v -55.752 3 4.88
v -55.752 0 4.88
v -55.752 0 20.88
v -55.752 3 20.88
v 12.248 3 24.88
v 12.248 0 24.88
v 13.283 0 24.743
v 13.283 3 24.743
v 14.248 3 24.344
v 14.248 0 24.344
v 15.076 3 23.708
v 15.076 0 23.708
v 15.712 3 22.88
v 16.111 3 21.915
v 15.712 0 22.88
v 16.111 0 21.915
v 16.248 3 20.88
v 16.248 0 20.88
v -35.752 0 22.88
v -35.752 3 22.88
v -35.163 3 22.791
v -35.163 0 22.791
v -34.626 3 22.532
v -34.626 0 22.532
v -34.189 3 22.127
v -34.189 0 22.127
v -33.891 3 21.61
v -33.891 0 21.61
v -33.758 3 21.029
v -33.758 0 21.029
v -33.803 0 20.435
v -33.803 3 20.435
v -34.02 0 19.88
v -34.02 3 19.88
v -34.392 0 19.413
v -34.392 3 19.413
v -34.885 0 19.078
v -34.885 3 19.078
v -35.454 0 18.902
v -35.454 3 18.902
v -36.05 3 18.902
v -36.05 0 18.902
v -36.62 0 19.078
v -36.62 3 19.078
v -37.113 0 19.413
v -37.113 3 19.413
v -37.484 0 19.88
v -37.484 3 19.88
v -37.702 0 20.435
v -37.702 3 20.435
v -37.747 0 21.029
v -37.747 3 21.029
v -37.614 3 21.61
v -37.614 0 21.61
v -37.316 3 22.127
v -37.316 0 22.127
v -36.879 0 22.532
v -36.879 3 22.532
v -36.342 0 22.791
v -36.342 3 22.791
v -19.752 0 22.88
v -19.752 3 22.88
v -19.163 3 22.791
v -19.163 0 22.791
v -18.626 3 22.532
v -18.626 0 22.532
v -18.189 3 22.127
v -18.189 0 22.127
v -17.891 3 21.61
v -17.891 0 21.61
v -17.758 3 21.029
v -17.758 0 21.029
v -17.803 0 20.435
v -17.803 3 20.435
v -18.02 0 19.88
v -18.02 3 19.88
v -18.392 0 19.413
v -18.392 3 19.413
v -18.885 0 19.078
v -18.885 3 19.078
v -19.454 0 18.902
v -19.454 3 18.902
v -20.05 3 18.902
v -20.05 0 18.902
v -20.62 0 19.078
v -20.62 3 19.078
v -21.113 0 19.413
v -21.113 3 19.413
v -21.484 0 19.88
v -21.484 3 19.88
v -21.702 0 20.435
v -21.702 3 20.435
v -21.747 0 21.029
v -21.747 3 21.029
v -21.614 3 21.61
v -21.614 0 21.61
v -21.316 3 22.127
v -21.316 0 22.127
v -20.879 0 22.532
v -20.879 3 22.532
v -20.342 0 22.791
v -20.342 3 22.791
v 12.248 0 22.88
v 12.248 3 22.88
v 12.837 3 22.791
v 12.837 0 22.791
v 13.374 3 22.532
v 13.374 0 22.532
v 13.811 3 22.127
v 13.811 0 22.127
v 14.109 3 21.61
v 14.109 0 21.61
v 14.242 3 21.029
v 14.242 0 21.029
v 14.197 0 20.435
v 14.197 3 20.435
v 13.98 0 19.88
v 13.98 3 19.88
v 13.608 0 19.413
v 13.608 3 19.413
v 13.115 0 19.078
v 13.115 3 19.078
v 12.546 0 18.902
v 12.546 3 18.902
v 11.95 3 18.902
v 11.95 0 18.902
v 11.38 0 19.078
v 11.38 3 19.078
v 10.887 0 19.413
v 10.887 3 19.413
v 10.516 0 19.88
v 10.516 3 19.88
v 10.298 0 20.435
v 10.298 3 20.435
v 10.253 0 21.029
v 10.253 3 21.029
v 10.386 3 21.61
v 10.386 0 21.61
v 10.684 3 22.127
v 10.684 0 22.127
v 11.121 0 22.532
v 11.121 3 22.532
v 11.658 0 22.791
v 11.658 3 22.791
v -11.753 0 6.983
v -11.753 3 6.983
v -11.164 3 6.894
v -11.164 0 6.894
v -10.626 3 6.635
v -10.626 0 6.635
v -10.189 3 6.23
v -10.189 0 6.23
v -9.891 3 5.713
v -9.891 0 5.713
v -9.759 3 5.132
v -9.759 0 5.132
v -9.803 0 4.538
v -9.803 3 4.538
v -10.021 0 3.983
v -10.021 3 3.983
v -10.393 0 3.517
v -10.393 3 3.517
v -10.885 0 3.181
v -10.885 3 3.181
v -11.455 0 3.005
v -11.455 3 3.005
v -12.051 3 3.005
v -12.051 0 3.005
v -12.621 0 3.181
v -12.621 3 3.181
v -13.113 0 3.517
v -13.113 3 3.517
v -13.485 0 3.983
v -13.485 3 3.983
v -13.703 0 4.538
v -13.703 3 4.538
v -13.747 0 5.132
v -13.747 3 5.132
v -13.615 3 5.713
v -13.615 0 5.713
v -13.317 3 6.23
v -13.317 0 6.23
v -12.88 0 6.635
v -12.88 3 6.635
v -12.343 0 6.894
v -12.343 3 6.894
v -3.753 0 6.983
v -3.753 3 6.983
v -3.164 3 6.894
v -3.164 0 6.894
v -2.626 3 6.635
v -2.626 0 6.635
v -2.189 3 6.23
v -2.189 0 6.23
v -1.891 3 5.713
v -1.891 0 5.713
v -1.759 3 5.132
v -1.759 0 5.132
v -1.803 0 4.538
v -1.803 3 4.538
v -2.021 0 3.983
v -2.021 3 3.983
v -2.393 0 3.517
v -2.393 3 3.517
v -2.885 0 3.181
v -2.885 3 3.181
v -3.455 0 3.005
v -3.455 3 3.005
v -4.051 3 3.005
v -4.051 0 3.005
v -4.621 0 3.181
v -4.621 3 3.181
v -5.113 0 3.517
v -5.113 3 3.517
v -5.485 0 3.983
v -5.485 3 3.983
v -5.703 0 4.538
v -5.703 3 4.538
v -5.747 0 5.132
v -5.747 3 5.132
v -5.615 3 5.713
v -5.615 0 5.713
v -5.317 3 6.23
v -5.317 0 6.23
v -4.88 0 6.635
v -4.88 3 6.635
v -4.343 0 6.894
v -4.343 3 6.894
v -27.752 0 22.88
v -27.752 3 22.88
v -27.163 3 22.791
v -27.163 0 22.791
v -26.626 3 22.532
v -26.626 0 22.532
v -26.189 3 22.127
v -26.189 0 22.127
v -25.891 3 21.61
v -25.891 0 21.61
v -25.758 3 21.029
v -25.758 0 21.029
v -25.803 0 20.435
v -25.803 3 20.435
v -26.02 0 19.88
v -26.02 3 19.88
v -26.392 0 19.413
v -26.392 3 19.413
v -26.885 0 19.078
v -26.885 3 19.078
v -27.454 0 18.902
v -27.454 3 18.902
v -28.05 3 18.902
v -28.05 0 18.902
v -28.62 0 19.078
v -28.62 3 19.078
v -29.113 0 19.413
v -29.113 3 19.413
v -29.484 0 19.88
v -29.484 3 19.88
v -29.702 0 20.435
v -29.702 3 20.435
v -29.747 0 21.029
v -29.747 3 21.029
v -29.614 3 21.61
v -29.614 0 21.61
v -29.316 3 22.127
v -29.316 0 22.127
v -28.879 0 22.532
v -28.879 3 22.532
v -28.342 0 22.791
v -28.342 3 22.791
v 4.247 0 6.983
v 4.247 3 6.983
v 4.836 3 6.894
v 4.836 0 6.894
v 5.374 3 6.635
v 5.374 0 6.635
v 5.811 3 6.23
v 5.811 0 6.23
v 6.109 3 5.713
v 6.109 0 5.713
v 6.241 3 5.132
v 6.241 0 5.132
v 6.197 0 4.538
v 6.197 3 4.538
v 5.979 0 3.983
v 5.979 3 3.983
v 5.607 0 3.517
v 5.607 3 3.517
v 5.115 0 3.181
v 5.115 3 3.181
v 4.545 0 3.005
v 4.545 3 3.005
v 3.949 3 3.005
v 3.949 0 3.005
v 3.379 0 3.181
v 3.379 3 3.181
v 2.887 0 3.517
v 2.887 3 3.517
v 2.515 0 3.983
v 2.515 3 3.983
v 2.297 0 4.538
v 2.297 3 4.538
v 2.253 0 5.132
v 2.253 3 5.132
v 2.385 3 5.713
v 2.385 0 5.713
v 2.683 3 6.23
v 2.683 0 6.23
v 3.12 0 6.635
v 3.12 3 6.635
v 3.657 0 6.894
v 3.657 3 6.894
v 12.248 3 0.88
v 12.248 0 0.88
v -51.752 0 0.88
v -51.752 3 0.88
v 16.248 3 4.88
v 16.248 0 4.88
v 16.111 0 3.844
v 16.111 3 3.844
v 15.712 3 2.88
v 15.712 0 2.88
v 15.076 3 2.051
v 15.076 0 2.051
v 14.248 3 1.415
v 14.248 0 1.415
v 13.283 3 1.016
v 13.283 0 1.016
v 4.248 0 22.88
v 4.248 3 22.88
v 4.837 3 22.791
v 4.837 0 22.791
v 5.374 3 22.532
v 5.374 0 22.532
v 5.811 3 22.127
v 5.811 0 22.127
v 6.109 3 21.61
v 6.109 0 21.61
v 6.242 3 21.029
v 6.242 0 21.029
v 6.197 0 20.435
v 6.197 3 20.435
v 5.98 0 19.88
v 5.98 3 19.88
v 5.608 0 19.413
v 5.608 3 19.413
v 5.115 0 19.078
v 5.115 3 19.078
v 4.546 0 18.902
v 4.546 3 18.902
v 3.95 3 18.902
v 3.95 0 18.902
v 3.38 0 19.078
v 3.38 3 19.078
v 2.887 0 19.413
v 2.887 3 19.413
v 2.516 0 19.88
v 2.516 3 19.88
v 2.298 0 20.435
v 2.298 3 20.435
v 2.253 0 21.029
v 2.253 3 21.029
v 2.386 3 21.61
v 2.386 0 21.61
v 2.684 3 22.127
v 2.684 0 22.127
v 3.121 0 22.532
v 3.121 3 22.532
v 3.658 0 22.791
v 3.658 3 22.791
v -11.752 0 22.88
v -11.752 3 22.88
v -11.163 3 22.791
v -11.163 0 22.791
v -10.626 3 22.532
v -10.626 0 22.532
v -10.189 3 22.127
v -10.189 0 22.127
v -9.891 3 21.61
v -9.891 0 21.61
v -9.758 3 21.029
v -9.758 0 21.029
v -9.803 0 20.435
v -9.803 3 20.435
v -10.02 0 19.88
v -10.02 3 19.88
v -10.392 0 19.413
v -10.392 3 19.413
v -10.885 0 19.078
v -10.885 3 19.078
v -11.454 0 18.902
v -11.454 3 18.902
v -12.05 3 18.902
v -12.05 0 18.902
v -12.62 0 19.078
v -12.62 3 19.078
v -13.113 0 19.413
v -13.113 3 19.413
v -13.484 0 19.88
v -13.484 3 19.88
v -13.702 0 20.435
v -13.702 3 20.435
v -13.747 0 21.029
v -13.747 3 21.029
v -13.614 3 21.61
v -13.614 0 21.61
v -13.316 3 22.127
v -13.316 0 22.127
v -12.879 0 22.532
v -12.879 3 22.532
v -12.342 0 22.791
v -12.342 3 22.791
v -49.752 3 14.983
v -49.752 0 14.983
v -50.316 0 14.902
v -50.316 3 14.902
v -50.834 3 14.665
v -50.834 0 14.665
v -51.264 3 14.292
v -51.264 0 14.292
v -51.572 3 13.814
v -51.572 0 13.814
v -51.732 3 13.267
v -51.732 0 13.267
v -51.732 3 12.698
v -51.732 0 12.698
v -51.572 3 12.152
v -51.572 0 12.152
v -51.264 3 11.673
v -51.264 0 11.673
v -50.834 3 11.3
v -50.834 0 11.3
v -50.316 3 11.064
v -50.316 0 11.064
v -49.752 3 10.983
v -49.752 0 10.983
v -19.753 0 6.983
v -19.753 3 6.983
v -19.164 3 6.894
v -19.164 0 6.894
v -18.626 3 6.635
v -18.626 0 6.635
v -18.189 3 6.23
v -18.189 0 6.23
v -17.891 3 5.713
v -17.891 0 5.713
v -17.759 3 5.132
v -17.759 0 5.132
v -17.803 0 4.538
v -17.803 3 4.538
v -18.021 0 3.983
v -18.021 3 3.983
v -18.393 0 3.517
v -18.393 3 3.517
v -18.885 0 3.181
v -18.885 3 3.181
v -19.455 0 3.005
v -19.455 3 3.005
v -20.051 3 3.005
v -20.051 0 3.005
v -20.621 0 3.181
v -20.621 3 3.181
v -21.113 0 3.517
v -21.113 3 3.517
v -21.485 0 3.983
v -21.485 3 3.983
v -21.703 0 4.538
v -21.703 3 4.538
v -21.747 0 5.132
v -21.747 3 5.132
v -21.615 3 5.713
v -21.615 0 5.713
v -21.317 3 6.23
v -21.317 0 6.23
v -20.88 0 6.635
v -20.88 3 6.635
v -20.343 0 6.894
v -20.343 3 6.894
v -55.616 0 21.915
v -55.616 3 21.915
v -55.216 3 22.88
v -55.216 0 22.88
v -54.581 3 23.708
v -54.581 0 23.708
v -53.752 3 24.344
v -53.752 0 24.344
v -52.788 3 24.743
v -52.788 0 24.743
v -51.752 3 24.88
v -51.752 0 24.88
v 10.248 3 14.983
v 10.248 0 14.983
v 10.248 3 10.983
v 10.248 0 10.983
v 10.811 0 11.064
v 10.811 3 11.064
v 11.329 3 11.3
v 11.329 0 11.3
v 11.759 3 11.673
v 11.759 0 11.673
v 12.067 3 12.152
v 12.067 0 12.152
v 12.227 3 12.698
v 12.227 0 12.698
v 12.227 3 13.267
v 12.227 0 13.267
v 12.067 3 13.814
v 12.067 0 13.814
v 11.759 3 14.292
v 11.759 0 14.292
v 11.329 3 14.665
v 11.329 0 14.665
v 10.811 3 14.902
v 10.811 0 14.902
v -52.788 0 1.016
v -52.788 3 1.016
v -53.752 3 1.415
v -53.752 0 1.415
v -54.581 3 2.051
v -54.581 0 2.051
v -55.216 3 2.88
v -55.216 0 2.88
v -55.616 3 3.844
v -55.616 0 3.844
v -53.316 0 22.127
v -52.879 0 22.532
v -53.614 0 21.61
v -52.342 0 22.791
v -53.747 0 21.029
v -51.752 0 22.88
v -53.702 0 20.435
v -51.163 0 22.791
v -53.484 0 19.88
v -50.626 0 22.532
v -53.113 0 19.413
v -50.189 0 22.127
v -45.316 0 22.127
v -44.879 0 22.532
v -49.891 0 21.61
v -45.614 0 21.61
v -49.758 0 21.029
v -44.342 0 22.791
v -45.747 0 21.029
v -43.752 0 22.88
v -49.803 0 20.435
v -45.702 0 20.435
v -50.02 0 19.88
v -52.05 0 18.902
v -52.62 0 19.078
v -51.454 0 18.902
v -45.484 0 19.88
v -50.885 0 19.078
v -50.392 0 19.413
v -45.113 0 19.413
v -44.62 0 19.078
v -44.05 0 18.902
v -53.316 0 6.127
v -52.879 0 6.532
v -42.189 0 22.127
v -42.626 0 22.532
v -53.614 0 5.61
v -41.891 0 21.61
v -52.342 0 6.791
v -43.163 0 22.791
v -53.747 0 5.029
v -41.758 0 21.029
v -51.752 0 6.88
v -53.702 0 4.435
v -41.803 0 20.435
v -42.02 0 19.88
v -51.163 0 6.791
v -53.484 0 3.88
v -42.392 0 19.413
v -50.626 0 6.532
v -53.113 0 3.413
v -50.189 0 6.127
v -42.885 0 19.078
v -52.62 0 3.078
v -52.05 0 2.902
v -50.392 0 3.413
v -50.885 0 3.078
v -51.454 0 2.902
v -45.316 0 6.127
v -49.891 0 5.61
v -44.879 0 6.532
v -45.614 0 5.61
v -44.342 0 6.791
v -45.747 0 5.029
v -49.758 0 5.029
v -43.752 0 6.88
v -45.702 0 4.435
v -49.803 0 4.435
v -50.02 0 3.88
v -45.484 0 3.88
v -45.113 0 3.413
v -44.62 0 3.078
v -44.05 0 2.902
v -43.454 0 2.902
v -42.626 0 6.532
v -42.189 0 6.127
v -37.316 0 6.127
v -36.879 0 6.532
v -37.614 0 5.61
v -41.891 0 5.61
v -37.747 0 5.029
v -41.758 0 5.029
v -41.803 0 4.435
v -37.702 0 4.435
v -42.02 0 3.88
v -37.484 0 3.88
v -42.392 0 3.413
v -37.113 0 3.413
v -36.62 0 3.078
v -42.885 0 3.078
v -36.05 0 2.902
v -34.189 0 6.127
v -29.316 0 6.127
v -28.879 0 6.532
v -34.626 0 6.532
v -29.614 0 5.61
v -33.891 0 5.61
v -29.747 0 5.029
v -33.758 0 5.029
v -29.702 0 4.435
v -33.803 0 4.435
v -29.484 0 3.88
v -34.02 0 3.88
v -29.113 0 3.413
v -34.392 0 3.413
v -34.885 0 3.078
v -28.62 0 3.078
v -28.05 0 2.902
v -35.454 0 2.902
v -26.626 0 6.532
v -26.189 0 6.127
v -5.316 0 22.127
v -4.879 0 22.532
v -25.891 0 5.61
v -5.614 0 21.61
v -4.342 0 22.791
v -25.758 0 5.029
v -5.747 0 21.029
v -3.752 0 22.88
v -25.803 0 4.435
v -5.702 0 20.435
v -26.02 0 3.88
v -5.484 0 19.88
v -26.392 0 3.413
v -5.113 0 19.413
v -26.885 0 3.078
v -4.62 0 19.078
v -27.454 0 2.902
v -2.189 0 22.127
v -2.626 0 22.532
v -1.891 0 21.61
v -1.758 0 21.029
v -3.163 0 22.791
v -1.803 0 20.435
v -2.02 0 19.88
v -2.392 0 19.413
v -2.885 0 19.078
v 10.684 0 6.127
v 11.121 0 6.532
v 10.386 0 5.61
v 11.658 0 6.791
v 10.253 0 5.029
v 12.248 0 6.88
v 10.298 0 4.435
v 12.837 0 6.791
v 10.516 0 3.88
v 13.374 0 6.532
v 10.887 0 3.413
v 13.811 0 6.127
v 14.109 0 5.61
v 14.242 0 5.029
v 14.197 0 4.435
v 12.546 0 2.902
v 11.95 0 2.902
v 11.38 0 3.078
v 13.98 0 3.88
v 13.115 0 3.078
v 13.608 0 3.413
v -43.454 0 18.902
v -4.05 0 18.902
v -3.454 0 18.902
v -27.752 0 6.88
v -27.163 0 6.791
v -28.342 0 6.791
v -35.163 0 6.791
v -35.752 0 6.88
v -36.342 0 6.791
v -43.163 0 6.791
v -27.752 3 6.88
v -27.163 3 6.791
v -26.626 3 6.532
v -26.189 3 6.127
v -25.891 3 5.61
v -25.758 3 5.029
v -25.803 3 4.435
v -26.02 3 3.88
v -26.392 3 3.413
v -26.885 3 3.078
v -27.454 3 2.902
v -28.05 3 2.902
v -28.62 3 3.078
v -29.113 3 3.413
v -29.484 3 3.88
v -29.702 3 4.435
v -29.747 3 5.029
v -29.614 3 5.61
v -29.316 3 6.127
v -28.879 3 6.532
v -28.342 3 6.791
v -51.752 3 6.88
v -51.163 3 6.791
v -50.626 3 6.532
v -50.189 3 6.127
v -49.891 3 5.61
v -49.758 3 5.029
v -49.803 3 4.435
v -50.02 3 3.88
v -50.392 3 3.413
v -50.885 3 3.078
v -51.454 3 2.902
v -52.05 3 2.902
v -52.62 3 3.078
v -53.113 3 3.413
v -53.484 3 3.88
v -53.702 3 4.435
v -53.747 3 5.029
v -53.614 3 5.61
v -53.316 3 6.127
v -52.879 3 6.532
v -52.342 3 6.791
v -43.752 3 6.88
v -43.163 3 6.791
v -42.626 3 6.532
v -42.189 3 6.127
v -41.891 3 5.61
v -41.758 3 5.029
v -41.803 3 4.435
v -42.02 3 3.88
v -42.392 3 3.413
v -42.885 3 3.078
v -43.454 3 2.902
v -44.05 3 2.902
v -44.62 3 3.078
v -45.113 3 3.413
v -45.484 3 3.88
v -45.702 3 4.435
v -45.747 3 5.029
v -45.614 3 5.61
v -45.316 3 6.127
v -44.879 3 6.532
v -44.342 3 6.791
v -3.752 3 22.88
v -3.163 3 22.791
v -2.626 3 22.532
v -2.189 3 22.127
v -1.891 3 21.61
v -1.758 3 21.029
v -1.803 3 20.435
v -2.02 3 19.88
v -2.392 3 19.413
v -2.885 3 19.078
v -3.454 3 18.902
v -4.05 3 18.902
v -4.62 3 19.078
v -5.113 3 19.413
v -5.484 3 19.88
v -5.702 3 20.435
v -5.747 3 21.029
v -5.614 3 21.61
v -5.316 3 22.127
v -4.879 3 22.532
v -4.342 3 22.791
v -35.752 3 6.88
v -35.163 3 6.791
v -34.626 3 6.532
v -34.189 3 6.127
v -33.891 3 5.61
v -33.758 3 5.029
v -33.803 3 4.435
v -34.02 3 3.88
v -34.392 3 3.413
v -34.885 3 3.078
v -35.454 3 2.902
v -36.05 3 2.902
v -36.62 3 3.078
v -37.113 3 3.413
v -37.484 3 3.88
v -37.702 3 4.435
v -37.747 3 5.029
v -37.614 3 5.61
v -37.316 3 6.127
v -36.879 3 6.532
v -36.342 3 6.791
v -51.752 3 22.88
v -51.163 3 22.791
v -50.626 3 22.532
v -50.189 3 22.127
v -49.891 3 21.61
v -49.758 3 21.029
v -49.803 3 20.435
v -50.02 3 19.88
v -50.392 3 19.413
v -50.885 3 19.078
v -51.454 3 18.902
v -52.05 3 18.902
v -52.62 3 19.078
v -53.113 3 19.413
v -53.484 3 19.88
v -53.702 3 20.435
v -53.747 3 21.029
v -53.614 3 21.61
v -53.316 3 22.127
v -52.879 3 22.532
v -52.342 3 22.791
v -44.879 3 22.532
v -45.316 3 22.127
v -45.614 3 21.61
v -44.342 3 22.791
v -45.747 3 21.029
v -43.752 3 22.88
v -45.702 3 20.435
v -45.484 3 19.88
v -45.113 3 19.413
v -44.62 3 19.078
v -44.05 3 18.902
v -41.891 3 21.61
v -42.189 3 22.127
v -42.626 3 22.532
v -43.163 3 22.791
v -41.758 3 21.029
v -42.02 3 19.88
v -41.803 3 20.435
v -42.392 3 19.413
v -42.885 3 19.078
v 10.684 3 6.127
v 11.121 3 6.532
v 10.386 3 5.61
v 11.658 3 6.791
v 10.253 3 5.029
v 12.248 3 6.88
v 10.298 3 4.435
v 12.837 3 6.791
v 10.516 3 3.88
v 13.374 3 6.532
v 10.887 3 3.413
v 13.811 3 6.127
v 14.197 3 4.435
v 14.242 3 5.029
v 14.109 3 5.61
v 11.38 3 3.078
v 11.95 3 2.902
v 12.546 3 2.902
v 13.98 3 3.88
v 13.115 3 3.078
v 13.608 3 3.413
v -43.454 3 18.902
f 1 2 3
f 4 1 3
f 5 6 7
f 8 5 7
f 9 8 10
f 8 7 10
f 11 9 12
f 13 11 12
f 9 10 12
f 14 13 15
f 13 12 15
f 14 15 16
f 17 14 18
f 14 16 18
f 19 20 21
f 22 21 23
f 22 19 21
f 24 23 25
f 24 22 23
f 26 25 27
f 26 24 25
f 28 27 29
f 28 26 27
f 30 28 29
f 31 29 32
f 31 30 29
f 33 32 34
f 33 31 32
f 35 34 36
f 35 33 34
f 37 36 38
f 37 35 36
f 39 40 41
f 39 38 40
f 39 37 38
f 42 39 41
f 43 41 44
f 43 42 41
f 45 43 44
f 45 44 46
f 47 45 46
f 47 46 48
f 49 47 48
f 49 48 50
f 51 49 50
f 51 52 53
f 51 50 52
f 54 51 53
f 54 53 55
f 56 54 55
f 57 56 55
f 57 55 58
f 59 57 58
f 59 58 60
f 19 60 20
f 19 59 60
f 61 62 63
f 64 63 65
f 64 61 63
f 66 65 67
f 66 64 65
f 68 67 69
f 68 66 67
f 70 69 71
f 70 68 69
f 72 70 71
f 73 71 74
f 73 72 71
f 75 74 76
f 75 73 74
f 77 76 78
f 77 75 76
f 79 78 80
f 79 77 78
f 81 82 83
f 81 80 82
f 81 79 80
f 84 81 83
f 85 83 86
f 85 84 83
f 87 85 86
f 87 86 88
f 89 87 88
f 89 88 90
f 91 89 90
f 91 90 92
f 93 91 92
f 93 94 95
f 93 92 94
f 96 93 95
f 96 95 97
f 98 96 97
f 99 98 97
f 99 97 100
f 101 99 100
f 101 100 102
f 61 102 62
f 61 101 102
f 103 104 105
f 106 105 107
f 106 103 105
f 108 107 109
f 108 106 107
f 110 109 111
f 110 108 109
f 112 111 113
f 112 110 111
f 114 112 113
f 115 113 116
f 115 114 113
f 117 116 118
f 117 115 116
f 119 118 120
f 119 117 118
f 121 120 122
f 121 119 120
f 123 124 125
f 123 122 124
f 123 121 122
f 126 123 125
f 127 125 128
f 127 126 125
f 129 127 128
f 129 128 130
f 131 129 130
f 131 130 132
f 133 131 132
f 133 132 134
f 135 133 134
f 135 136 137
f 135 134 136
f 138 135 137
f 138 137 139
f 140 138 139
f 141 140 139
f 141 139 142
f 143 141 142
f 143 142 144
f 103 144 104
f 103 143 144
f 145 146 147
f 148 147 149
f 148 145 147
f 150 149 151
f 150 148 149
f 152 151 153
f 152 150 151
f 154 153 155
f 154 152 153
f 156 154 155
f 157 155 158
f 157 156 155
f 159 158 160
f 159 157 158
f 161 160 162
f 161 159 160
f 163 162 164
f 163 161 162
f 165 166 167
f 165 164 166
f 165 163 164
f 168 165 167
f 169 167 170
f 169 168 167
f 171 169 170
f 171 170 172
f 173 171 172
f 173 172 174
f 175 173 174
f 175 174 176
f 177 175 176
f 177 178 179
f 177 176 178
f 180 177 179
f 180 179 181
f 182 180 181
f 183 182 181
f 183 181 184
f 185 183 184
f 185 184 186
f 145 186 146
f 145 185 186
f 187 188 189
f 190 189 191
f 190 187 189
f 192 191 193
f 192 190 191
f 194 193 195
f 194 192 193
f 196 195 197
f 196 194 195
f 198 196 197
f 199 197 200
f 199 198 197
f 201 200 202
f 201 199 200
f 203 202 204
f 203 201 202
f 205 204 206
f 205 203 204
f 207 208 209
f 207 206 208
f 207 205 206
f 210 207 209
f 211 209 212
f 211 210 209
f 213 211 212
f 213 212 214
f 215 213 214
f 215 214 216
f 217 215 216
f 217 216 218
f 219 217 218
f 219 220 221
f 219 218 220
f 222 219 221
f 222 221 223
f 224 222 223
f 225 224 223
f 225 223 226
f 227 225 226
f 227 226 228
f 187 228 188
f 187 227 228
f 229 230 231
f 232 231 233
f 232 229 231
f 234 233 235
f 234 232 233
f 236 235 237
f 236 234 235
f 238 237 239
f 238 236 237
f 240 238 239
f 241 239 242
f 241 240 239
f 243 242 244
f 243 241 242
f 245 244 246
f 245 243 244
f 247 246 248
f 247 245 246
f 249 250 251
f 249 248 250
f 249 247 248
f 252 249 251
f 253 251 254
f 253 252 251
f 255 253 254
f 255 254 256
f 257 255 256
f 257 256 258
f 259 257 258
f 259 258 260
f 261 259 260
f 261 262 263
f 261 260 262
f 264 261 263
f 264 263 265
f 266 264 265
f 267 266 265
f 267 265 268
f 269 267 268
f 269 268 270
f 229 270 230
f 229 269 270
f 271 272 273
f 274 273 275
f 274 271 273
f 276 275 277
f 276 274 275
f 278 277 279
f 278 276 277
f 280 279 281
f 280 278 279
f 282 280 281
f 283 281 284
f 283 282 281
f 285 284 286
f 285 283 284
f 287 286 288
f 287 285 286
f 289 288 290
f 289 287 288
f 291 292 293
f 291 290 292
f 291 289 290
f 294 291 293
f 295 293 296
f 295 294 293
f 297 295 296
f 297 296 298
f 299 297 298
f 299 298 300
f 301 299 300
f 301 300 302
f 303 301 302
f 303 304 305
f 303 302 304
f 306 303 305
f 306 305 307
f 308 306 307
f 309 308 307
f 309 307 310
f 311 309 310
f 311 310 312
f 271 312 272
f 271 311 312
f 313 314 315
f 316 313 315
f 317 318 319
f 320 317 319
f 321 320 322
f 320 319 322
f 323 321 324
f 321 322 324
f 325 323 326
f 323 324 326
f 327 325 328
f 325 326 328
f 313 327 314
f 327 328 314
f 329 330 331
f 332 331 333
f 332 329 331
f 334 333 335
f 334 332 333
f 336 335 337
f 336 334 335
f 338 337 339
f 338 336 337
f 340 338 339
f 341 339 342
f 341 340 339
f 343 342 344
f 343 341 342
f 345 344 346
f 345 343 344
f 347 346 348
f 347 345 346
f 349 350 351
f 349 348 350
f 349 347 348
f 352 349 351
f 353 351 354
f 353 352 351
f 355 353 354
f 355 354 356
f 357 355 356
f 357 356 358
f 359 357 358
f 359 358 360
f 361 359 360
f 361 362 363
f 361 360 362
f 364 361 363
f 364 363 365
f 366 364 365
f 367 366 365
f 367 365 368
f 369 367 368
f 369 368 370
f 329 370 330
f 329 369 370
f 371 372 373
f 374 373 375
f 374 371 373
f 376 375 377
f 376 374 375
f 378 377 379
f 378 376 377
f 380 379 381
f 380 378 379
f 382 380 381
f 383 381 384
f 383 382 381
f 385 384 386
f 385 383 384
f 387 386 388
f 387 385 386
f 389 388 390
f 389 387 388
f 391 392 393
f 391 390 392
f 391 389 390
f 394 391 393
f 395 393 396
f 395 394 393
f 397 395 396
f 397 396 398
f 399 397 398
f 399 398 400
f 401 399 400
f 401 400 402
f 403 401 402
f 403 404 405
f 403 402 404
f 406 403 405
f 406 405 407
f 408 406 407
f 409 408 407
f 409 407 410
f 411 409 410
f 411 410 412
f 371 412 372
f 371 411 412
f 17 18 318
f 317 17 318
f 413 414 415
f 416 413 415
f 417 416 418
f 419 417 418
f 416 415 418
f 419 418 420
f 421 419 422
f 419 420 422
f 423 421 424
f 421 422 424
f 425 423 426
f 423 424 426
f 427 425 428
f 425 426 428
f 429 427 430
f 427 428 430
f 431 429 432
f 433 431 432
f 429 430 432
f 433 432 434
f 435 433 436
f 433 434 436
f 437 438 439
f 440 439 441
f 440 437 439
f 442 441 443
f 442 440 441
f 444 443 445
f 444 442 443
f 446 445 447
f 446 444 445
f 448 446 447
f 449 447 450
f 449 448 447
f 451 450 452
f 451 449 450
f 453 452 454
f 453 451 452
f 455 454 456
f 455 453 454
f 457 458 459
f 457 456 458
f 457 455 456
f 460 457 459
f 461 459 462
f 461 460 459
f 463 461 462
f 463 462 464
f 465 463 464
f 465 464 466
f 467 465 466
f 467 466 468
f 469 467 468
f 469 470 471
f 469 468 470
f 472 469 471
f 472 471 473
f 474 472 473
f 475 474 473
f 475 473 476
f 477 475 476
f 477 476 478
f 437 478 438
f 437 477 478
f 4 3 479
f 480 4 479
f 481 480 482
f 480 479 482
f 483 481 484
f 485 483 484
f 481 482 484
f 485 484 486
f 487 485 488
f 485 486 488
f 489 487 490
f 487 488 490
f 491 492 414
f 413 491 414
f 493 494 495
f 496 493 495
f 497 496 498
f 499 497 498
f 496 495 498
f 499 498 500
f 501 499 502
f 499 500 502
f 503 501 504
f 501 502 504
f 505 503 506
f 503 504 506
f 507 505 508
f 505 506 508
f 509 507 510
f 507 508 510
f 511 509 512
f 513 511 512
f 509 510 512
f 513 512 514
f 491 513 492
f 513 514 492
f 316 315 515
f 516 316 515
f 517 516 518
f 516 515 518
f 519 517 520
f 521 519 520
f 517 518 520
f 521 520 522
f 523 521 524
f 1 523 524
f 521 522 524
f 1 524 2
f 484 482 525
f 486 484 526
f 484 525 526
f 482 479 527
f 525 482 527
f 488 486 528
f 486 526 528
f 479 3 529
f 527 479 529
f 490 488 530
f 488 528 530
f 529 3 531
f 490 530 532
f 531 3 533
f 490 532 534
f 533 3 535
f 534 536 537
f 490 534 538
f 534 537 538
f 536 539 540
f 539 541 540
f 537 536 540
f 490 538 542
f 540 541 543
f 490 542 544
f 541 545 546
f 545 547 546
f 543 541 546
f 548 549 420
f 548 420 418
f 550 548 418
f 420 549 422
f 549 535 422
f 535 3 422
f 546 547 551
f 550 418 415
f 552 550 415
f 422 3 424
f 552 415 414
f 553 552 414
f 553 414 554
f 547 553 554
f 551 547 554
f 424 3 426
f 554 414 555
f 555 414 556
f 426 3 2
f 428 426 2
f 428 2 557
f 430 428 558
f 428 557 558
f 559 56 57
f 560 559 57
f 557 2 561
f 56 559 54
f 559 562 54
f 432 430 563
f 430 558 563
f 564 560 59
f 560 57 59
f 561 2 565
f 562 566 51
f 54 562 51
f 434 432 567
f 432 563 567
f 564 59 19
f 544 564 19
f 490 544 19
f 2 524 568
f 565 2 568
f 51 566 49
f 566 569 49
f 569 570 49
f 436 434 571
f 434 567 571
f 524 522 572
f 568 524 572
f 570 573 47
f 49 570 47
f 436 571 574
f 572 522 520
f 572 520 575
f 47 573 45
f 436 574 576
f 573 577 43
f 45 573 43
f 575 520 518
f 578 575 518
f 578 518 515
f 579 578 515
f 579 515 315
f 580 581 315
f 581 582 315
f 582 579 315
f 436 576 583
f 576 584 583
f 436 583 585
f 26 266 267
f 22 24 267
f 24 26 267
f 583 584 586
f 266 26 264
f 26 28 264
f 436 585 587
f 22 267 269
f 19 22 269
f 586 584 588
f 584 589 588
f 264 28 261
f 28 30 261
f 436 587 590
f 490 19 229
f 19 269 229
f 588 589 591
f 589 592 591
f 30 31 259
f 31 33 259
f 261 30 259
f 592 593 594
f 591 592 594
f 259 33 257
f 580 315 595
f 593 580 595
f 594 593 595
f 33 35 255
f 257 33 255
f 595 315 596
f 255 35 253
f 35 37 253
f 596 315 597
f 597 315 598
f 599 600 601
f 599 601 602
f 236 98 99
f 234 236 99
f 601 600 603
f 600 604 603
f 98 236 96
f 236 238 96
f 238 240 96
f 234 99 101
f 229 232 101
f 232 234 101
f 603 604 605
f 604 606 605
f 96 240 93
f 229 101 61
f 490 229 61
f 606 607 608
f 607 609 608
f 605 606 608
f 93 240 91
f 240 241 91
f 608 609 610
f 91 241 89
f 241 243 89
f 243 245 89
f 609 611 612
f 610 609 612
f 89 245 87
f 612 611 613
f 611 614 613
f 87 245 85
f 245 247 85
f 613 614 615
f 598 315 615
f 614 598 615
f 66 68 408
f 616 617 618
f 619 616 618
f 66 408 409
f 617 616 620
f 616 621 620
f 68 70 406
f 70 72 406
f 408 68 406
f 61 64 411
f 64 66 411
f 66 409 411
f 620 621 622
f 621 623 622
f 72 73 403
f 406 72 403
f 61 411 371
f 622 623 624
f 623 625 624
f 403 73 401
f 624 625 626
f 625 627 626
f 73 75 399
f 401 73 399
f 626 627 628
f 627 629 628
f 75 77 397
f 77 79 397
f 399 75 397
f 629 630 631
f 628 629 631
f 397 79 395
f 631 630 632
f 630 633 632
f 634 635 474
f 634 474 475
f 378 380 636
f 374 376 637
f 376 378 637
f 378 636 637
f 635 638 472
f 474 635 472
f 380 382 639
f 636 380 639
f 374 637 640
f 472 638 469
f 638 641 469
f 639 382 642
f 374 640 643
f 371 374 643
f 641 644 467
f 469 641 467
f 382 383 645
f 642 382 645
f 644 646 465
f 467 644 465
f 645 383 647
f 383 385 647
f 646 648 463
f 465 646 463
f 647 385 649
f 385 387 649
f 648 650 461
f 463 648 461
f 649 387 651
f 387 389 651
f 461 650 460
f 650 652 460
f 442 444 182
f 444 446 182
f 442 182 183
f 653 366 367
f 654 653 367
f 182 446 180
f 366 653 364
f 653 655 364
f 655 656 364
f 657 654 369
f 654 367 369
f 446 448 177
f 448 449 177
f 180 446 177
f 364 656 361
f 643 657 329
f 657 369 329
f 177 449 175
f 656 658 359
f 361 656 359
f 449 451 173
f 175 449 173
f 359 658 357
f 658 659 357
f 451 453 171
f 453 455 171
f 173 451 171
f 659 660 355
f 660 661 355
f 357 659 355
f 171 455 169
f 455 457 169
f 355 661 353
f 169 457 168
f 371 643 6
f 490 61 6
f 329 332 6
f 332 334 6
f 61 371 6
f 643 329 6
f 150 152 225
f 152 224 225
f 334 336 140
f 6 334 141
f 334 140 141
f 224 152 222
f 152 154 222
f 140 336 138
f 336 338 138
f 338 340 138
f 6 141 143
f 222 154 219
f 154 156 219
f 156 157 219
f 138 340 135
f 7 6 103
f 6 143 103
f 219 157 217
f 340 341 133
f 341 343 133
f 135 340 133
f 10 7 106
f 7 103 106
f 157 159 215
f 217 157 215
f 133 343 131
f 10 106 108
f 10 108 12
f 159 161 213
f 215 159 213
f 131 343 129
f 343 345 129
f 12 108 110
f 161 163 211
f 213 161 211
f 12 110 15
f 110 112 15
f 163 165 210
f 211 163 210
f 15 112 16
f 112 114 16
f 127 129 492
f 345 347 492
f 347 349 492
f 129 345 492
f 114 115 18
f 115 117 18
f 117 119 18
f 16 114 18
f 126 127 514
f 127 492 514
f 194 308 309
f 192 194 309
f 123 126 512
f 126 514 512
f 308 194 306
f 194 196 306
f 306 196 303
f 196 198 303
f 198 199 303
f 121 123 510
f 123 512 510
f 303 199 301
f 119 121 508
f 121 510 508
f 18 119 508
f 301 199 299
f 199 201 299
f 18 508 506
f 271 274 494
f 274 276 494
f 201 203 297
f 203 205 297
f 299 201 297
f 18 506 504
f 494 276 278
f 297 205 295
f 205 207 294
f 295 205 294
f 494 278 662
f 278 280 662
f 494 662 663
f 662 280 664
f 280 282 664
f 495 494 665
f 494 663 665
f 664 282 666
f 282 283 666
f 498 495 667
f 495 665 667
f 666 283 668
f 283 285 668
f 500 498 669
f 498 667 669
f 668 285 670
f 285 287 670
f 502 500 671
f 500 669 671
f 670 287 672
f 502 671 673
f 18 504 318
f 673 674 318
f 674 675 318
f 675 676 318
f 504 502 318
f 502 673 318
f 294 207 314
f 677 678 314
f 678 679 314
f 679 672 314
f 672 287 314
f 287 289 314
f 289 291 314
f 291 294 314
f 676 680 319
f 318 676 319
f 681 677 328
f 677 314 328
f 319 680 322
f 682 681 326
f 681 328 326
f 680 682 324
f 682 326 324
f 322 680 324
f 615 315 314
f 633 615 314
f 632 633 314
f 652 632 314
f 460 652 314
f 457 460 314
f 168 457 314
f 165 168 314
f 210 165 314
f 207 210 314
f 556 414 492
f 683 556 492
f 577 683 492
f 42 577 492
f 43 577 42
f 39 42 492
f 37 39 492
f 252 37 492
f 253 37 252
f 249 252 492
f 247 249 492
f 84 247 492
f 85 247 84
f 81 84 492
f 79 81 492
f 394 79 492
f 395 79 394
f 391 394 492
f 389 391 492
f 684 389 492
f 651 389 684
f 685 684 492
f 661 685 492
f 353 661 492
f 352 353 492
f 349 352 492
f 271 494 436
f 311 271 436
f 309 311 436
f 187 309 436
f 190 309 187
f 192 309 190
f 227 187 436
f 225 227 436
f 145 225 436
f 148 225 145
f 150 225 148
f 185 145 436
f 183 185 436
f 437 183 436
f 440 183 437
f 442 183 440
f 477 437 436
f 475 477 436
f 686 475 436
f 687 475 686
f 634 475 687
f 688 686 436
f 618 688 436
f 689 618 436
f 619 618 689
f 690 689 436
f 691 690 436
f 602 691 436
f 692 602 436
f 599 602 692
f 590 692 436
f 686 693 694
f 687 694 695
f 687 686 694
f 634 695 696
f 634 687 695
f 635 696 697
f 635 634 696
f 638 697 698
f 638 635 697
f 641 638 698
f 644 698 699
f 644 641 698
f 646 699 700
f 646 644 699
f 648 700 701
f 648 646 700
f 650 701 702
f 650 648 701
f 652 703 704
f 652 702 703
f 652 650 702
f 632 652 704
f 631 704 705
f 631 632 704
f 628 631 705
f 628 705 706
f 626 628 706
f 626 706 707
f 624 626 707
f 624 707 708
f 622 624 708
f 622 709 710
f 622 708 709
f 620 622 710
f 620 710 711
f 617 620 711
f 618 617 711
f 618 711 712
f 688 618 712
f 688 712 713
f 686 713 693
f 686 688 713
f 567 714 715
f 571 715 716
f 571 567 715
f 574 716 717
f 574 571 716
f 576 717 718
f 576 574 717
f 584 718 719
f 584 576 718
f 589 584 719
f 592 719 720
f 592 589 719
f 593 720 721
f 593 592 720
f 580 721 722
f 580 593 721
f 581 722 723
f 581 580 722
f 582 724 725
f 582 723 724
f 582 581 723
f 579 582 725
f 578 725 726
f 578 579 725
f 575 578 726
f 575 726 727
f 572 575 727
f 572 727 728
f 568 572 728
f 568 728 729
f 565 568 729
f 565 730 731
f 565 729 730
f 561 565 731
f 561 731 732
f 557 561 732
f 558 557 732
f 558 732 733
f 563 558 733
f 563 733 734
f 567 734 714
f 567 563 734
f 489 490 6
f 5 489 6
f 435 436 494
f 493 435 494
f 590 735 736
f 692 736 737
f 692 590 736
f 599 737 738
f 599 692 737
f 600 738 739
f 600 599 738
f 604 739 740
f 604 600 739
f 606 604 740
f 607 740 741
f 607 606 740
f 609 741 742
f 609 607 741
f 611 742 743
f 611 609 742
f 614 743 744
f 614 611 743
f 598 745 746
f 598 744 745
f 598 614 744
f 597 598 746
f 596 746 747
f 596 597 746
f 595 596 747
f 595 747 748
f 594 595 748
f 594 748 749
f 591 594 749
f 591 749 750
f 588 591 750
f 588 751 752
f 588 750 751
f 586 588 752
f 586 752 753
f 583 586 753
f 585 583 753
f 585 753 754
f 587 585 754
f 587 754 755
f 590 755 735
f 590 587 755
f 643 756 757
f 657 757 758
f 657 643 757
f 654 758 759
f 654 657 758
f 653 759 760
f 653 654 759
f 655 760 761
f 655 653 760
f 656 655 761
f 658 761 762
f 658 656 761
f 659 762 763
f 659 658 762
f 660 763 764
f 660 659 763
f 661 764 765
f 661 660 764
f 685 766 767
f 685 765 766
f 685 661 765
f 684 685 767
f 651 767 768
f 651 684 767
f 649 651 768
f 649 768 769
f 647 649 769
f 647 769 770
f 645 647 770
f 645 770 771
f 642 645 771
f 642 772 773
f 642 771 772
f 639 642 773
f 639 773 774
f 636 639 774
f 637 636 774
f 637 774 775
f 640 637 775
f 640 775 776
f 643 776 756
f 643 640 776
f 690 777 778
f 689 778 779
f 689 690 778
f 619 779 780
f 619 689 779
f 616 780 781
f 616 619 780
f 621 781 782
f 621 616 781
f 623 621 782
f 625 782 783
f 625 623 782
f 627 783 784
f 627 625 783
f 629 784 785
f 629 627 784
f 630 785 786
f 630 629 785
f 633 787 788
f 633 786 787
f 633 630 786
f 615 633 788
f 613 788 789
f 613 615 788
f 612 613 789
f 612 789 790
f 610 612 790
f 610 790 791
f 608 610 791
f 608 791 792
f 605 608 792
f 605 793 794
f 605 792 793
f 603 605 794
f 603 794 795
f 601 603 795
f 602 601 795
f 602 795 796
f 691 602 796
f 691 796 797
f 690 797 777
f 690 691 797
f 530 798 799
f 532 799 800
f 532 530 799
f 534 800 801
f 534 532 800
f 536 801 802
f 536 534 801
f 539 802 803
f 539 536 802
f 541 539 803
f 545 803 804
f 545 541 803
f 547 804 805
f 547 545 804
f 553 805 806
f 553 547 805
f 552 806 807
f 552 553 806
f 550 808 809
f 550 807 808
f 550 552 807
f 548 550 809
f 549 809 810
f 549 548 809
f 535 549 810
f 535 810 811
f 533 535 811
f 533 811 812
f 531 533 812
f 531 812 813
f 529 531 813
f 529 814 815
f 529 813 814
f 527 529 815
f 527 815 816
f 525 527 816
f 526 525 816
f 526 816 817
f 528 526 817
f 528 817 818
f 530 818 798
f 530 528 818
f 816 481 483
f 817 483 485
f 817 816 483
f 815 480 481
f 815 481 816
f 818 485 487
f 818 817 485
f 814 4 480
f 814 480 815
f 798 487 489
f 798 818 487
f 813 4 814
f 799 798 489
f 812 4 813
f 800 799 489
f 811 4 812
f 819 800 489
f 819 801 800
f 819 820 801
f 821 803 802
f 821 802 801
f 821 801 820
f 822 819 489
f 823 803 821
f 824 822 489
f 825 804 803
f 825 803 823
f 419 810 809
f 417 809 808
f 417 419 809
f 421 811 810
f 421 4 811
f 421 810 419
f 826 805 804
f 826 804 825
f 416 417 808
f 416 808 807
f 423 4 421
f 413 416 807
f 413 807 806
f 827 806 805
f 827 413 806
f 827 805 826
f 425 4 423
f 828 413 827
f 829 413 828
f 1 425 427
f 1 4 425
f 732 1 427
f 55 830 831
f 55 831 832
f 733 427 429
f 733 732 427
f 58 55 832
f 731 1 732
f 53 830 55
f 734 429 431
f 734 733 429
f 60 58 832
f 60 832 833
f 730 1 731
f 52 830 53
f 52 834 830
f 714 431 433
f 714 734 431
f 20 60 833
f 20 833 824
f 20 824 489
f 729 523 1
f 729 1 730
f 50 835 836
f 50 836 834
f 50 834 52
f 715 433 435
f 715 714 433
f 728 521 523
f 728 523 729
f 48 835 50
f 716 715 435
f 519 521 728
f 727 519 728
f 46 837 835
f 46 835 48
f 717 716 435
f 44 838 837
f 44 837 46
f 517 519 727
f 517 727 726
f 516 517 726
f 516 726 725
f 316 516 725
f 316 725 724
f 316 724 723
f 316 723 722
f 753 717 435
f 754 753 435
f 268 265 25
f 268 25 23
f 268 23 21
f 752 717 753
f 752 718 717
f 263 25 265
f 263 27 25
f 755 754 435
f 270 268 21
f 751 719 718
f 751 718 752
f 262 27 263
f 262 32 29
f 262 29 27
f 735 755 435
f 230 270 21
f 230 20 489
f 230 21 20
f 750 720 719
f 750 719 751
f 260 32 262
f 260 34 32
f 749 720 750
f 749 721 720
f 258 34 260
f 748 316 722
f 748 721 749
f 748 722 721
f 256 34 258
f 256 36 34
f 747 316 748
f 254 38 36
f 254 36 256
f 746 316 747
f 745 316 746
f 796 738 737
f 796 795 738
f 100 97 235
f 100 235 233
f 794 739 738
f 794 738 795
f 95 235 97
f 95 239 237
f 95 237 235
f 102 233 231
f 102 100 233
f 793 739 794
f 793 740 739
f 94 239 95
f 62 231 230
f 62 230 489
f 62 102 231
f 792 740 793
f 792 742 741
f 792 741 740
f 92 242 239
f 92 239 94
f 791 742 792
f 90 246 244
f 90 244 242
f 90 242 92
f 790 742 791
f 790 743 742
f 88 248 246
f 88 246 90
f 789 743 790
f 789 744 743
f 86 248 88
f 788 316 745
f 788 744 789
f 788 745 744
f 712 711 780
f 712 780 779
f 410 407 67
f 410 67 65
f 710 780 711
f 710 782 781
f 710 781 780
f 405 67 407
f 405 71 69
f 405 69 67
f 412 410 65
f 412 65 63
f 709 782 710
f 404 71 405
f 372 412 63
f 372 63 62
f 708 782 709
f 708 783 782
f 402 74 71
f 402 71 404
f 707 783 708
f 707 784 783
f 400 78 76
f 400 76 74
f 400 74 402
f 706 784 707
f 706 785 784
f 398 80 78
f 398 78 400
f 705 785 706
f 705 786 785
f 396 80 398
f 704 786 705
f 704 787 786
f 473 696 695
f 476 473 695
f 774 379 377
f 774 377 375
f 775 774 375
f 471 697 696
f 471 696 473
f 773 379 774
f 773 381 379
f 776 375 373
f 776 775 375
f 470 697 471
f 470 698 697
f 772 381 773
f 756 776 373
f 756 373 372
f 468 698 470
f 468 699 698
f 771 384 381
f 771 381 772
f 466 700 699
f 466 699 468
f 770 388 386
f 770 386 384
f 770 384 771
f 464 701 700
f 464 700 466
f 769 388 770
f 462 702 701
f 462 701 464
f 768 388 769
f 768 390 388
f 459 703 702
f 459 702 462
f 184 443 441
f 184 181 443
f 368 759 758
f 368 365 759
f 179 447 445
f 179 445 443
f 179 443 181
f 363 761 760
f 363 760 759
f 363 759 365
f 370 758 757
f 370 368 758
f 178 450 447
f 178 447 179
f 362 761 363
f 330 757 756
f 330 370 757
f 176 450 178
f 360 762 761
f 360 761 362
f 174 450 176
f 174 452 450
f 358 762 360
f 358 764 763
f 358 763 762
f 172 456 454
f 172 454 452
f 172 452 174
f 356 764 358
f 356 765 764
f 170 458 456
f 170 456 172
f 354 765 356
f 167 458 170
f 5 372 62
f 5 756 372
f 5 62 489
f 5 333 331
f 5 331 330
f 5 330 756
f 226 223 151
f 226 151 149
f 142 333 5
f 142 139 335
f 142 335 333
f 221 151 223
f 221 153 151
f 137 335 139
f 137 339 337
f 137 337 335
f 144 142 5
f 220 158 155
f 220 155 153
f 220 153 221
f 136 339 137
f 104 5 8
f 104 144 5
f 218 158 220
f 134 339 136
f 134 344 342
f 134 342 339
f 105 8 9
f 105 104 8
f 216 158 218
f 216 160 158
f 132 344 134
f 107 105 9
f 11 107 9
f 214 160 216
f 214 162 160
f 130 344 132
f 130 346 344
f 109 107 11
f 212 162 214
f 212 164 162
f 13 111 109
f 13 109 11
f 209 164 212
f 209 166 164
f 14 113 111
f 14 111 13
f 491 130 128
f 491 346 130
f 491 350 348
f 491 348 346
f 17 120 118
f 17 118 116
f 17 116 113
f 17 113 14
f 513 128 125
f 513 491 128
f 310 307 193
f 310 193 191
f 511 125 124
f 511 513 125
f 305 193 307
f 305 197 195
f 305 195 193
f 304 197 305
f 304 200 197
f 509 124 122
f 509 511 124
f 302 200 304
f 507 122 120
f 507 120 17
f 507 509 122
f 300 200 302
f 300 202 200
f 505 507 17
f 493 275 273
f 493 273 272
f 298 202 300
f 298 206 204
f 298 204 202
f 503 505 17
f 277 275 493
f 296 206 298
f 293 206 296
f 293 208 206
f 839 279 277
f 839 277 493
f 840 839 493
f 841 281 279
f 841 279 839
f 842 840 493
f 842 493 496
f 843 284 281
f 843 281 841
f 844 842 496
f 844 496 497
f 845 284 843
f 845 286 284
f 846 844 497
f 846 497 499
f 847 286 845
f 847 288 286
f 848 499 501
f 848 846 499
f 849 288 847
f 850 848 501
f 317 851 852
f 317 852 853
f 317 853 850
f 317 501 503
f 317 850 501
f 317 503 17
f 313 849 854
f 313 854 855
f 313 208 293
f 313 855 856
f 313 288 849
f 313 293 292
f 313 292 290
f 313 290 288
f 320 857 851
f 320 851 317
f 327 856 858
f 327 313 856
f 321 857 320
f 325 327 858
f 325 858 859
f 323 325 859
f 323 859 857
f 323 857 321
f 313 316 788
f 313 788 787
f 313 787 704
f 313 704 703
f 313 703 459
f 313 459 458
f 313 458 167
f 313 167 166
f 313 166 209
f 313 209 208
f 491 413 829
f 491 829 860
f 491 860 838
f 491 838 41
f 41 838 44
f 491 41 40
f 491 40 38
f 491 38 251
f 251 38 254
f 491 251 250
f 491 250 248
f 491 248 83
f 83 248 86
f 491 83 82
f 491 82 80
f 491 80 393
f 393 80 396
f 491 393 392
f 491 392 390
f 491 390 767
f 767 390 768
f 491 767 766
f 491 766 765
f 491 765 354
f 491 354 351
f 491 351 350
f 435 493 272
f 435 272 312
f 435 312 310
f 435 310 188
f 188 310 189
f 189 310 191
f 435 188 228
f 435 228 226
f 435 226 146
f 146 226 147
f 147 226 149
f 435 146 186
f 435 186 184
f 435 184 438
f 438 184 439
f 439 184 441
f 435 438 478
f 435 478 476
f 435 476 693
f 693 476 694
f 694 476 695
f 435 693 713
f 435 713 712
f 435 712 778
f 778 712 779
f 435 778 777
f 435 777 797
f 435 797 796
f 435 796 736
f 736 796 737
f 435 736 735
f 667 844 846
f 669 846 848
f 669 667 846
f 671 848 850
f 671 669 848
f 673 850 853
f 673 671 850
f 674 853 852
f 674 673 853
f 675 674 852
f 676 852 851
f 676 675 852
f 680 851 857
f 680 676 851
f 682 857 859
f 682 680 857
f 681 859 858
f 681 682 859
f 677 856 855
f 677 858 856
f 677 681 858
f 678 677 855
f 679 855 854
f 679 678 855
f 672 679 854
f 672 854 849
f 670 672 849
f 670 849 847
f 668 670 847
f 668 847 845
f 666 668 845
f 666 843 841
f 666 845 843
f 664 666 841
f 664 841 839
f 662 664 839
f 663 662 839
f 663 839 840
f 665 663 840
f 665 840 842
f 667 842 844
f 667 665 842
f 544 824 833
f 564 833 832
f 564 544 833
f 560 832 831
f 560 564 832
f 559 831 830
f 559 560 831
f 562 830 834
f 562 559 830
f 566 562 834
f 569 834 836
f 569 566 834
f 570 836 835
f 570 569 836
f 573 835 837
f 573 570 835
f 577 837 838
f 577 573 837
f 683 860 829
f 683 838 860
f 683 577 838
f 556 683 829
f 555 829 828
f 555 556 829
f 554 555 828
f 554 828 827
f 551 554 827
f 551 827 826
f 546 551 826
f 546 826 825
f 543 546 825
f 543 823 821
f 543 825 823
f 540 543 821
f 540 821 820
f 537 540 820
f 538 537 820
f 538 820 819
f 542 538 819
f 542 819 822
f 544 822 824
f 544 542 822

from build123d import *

# Parameters (mm, degrees)
BOSS_EXTRUDE1_DEPTH = 3
SKETCH12_R          = 2
CUT_EXTRUDE1_DEPTH  = 11


with BuildPart() as part:
    # Sketch11 → Boss-Extrude1 (new body)
    with BuildSketch(Plane(origin=(0, 0, 0), x_dir=(1, 0, 0), z_dir=(0, 1, 0))):
        with BuildLine():
            Line((-55.752395734, -4.879563459), (-55.752395734, -20.879563459))
            ThreePointArc((-55.752395734, -20.879563459), (-54.580822858, -23.707990583), (-51.752395734, -24.879563459))
            Line((-51.752395734, -24.879563459), (12.247604266, -24.879563459))
            ThreePointArc((12.247604266, -24.879563459), (15.076031391, -23.707990583), (16.247604266, -20.879563459))
            Line((16.247604266, -20.879563459), (16.247604266, -4.879563459))
            ThreePointArc((16.247604266, -4.879563459), (15.076031391, -2.051136334), (12.247604266, -0.879563459))
            Line((12.247604266, -0.879563459), (-51.752395734, -0.879563459))
            ThreePointArc((-51.752395734, -0.879563459), (-54.580822858, -2.051136334), (-55.752395734, -4.879563459))
        make_face()
    extrude(amount=BOSS_EXTRUDE1_DEPTH)

    # Sketch12 → Cut-Extrude1 (cut)
    with BuildSketch(Plane(origin=(0, 0, 0), x_dir=(1, 0, 0), z_dir=(0, 1, 0))):
        with Locations(Location((-51.752395734, -4.879563459, 0), (0, 0, 270))):
            Circle(SKETCH12_R)
        with Locations(Location((-43.752395734, -4.879563459, 0), (0, 0, 270))):
            Circle(SKETCH12_R)
        with Locations(Location((-35.752395734, -4.879563459, 0), (0, 0, 270))):
            Circle(SKETCH12_R)
        with Locations(Location((-27.752395734, -4.879563459, 0), (0, 0, 270))):
            Circle(SKETCH12_R)
        with Locations(Location((-19.75306076, -4.982713721, 0), (0, 0, 270))):
            Circle(SKETCH12_R)
        with Locations(Location((-11.75306076, -4.982713721, 0), (0, 0, 270))):
            Circle(SKETCH12_R)
        with Locations(Location((-3.75306076, -4.982713721, 0), (0, 0, 270))):
            Circle(SKETCH12_R)
        with Locations(Location((4.24693924, -4.982713721, 0), (0, 0, 270))):
            Circle(SKETCH12_R)
        with Locations(Location((12.247604266, -4.879563459, 0), (0, 0, 270))):
            Circle(SKETCH12_R)
        with Locations(Location((-51.752395734, -20.879563459, 0), (0, 0, 270))):
            Circle(SKETCH12_R)
        with Locations(Location((-43.752395734, -20.879563459, 0), (0, 0, 270))):
            Circle(SKETCH12_R)
        with Locations(Location((-35.752395734, -20.879563459, 0), (0, 0, 270))):
            Circle(SKETCH12_R)
        with Locations(Location((-27.752395734, -20.879563459, 0), (0, 0, 270))):
            Circle(SKETCH12_R)
        with Locations(Location((-19.752395734, -20.879563459, 0), (0, 0, 270))):
            Circle(SKETCH12_R)
        with Locations(Location((-11.752395734, -20.879563459, 0), (0, 0, 270))):
            Circle(SKETCH12_R)
        with Locations(Location((-3.752395734, -20.879563459, 0), (0, 0, 270))):
            Circle(SKETCH12_R)
        with Locations(Location((4.247604266, -20.879563459, 0), (0, 0, 270))):
            Circle(SKETCH12_R)
        with Locations(Location((12.247604266, -20.879563459, 0), (0, 0, 270))):
            Circle(SKETCH12_R)
        with BuildLine():
            Line((10.247604266, -14.982713721), (-49.752395734, -14.982713721))
            ThreePointArc((-49.752395734, -14.982713721), (-51.752395734, -12.982713721), (-49.752395734, -10.982713721))
            Line((-49.752395734, -10.982713721), (10.247604266, -10.982713721))
            ThreePointArc((10.247604266, -10.982713721), (12.247604266, -12.982713721), (10.247604266, -14.982713721))
        make_face()
    extrude(amount=CUT_EXTRUDE1_DEPTH, mode=Mode.SUBTRACT)


solid = part.part
